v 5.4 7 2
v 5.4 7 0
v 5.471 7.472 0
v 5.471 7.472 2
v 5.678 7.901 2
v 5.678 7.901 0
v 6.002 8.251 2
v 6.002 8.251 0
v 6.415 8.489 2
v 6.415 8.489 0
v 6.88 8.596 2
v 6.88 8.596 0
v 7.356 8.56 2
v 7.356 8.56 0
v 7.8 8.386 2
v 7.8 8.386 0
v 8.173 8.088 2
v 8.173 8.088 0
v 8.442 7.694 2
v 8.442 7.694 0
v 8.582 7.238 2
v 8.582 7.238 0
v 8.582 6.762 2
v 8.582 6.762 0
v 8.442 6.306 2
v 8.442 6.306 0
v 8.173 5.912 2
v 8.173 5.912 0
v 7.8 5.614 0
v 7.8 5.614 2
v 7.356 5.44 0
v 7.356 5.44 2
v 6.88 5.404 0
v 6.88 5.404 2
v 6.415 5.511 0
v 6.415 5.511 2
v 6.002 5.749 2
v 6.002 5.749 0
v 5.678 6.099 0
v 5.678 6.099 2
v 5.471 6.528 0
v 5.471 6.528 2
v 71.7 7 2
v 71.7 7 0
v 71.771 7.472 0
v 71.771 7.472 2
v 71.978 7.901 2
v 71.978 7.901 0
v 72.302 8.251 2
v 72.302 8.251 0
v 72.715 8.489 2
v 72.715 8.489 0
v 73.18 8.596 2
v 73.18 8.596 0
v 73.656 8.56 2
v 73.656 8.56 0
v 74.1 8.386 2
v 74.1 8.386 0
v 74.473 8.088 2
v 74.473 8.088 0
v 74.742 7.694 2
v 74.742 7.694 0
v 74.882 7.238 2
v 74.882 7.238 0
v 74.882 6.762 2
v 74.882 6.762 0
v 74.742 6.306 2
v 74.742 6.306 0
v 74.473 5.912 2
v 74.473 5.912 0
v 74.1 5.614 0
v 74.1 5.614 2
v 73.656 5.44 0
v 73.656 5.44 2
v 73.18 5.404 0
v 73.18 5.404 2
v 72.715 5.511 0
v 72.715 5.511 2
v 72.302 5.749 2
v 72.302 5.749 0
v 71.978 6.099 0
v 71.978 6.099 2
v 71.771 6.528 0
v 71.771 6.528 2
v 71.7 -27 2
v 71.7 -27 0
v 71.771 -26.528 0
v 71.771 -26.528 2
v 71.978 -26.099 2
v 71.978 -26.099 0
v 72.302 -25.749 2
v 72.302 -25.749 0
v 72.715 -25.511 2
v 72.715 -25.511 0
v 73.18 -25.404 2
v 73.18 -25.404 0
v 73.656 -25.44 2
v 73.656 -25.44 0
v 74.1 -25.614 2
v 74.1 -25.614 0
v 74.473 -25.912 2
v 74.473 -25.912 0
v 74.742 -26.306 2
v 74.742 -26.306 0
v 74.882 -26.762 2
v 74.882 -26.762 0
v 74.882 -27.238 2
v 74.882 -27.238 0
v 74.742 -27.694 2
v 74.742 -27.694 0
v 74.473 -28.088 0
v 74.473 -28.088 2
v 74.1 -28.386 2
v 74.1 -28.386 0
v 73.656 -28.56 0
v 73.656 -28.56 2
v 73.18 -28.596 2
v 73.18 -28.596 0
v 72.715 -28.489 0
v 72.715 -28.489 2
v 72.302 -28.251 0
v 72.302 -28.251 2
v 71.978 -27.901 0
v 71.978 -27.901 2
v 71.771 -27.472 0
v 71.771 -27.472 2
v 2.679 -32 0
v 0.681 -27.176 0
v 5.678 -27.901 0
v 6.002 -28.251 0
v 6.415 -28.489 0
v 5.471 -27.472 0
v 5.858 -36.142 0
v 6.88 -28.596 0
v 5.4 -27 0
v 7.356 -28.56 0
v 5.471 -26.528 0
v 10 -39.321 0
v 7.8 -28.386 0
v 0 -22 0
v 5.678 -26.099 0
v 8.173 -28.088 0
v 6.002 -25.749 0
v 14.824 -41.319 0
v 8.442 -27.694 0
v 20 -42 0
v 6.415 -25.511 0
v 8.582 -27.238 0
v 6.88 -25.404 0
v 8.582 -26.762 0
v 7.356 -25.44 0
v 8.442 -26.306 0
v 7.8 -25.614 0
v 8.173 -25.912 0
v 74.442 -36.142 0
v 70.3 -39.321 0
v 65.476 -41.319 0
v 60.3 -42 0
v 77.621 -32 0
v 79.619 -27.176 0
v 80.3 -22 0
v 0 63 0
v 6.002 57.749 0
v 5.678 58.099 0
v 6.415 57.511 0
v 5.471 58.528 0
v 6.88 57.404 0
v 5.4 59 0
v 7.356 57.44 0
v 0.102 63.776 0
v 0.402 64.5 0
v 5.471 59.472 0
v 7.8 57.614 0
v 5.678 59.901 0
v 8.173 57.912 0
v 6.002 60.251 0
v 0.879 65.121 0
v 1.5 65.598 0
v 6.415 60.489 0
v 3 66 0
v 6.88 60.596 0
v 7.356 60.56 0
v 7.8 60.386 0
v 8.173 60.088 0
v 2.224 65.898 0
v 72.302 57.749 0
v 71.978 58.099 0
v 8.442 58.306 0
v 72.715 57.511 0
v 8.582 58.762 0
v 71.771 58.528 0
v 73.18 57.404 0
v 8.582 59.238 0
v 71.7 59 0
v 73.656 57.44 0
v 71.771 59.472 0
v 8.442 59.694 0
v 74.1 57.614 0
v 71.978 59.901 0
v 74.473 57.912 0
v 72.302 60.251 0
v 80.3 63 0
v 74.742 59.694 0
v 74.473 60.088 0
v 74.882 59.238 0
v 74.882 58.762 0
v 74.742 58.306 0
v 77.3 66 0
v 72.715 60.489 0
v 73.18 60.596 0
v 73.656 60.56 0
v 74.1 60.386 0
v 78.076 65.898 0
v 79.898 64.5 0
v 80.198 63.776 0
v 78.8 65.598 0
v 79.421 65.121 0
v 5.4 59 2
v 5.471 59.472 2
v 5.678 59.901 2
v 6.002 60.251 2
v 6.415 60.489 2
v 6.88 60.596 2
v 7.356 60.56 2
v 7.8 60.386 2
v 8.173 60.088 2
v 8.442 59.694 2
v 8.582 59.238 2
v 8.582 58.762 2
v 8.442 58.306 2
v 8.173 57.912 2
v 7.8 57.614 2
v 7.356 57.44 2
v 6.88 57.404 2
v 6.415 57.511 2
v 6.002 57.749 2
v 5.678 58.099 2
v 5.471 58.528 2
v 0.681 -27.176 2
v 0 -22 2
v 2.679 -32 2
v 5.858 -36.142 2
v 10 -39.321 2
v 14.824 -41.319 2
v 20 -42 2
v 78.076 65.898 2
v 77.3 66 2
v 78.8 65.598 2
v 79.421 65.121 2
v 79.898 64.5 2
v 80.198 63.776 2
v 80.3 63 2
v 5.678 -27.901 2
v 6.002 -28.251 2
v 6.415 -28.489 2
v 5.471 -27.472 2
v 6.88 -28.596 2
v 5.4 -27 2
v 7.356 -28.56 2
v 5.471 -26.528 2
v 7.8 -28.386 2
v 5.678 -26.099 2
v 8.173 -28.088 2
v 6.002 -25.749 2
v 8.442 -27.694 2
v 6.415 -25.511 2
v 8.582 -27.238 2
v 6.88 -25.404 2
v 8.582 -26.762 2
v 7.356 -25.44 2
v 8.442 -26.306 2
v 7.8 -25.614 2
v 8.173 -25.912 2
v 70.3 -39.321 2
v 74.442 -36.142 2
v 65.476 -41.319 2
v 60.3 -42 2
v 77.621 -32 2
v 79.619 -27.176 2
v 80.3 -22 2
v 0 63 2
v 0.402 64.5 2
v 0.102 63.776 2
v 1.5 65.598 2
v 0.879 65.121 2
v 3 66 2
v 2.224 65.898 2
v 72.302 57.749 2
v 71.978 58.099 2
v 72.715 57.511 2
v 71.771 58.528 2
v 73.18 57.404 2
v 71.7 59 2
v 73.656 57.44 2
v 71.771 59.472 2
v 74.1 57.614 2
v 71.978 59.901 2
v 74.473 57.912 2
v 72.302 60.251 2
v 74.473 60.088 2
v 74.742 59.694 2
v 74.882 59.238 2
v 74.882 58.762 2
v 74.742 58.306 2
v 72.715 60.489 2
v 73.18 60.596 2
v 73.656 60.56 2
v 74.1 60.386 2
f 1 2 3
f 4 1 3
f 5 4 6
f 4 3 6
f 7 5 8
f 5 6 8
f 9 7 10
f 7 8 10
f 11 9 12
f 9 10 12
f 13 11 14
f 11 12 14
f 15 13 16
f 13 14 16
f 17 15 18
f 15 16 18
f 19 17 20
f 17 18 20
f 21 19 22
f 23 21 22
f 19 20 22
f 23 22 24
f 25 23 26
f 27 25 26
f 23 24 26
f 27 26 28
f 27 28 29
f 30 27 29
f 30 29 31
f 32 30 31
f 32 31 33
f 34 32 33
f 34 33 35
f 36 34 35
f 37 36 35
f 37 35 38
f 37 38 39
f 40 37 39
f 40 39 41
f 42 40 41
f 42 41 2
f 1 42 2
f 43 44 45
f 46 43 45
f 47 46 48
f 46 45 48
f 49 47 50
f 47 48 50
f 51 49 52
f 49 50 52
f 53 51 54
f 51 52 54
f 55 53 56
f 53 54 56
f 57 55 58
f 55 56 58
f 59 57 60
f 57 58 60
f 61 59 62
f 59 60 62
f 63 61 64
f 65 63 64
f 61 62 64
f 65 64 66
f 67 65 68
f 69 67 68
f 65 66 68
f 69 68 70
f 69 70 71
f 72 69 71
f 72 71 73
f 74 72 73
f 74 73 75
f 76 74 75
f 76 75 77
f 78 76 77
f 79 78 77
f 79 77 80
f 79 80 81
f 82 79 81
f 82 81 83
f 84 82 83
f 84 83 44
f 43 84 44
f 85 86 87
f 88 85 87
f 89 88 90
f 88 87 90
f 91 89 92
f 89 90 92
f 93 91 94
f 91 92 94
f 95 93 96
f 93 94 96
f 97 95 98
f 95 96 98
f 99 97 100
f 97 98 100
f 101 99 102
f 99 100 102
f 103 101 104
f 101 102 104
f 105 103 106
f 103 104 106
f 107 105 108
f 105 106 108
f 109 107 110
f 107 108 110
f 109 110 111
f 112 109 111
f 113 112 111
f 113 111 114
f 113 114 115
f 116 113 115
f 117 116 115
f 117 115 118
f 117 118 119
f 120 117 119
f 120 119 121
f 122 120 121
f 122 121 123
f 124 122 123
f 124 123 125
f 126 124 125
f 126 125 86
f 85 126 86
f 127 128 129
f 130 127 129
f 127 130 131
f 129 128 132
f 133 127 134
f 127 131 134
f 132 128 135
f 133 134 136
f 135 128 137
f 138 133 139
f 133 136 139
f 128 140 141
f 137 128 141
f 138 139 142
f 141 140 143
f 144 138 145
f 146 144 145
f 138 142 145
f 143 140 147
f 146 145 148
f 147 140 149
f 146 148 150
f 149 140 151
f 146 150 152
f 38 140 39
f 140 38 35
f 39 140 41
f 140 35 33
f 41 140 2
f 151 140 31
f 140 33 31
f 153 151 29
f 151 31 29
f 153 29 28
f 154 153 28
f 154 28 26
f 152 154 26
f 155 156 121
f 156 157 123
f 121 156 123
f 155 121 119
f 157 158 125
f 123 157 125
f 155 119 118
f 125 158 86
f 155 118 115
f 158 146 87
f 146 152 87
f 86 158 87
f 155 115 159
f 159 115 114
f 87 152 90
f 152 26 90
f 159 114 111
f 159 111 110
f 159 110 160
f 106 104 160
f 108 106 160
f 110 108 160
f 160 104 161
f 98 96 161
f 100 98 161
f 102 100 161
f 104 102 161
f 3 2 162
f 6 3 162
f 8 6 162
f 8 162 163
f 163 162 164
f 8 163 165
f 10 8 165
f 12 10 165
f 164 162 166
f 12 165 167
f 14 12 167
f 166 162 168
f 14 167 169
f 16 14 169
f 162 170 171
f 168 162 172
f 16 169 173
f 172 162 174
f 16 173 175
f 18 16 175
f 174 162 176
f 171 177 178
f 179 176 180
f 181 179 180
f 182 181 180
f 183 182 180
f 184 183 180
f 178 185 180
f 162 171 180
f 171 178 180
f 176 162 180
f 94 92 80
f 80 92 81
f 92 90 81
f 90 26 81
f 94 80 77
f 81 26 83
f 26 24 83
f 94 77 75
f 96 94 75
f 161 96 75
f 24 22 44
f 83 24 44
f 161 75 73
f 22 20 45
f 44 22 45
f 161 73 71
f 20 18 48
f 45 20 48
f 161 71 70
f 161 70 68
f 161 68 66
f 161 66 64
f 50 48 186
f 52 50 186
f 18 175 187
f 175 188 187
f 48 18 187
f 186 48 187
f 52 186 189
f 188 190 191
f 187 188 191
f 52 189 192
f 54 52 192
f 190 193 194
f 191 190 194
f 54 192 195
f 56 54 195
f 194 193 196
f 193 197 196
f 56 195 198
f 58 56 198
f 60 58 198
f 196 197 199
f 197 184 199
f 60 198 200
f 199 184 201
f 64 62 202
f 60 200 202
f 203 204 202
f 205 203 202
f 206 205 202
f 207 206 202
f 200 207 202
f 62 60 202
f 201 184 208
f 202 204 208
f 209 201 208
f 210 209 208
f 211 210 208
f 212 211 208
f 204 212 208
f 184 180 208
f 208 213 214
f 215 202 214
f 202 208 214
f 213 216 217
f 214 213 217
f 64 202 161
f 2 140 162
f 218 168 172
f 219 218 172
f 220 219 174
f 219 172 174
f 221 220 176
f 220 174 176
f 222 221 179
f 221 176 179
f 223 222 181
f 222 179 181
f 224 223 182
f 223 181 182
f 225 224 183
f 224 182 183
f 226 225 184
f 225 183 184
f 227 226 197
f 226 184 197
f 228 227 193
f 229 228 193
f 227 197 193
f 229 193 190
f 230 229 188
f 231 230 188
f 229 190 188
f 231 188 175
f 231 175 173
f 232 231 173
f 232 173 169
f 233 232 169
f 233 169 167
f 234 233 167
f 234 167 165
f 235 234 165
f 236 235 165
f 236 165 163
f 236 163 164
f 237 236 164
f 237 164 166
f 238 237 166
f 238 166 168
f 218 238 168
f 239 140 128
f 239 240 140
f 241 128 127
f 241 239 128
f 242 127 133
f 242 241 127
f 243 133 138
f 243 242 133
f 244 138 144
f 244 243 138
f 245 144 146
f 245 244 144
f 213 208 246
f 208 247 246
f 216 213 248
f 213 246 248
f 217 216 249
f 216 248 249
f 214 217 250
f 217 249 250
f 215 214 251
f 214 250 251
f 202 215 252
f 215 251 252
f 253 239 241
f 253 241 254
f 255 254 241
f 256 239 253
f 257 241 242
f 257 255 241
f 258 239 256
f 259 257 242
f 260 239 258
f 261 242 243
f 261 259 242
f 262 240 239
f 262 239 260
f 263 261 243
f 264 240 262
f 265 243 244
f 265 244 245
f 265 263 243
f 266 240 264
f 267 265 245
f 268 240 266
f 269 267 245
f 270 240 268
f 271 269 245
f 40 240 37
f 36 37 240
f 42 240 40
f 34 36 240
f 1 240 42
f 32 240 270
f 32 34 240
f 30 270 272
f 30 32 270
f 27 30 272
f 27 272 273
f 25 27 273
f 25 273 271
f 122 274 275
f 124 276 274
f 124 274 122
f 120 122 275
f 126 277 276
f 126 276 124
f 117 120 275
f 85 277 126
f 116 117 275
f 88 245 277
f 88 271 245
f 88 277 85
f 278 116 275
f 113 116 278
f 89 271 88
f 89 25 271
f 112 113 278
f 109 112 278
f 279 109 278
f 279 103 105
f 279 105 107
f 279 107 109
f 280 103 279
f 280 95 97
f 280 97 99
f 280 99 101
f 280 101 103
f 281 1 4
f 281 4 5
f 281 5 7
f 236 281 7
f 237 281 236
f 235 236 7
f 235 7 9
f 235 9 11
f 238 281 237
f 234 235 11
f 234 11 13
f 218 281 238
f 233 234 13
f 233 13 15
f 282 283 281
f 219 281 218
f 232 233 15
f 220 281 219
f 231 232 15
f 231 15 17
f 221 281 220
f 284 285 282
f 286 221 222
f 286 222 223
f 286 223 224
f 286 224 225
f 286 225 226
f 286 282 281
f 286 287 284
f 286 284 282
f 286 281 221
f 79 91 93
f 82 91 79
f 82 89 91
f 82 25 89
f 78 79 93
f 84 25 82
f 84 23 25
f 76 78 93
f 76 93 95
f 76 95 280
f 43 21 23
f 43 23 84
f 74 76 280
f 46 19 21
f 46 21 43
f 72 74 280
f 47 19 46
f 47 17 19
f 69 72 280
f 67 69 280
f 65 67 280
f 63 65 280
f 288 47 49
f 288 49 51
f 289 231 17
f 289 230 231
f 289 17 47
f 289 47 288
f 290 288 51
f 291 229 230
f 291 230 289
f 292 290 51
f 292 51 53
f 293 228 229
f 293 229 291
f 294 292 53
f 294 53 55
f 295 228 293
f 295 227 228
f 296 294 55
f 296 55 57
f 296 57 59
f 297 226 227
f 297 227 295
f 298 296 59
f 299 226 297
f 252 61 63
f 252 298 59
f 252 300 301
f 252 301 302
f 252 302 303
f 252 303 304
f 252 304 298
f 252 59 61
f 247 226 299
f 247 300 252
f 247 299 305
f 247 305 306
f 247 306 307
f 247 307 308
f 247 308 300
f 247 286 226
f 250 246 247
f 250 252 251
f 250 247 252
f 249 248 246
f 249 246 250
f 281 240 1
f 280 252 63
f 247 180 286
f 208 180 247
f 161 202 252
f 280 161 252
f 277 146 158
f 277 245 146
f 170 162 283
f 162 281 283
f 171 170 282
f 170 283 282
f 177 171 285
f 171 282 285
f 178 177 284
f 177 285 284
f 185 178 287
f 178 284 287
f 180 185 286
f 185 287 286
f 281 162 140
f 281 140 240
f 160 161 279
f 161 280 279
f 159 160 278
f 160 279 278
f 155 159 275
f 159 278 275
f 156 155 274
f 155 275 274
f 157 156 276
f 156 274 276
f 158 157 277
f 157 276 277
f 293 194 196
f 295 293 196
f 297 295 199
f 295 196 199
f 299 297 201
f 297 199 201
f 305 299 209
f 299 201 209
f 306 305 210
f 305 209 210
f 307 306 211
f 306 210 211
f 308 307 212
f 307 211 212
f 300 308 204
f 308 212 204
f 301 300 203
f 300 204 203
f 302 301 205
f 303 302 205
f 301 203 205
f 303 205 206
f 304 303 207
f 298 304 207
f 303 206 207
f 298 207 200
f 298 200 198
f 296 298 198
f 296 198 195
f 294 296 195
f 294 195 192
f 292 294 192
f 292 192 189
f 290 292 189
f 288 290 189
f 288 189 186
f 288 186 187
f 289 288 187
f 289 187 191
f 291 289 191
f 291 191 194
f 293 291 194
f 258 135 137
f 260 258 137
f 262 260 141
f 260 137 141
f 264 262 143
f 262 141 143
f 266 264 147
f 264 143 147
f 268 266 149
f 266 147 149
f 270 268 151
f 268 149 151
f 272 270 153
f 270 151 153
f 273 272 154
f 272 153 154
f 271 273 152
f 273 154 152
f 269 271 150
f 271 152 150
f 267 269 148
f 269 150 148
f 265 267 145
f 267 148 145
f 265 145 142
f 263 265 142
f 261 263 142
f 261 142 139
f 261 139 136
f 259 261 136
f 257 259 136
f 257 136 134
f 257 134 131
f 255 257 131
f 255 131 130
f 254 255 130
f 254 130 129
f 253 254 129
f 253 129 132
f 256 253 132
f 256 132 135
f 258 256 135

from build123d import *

# Parameters (mm, degrees)
SKETCH1_W                      = 80.3
SKETCH1_H                      = 66
BOSS_EXTRUDE1_DEPTH            = 2
F_3_2_3_2_DIAMETER_HOLE1_D     = 3.2
FILLET1_R                      = 3
SKETCH4_W                      = 80.3
SKETCH4_H                      = 2
BOSS_EXTRUDE2_DEPTH            = 42
FILLET2_R                      = 20
F_3_2_3_2_DIAMETER_HOLE2_D     = 3.2
F_3_2_3_2_DIAMETER_HOLE2_DEPTH = 60
F_3_2_3_2_DIAMETER_HOLE2_TIP   = 0.96137699


with BuildPart() as part:
    # Sketch1 → Boss-Extrude1 (new body)
    with BuildSketch(Plane.XY):
        with Locations((40.15, 33)):
            Rectangle(SKETCH1_W, SKETCH1_H)
    extrude(amount=BOSS_EXTRUDE1_DEPTH)

    # Ø3.2 (3.2) Diameter Hole1 (through all)
    with Locations(Plane.XY.offset(2)):
        with Locations((7, 59), (73.3, 59), (73.3, 7), (7, 7)):
            Hole(F_3_2_3_2_DIAMETER_HOLE1_D / 2)

    # Fillet1
    fillet1_edges = [part.edges().sort_by_distance(p)[0] for p in [
        (0, 66, 1),
        (80.3, 66, 1),
    ]]
    fillet(fillet1_edges, radius=FILLET1_R)

    # Sketch4 → Boss-Extrude2 (add)
    with BuildSketch(Plane.XZ):
        with Locations((40.15, 1)):
            Rectangle(SKETCH4_W, SKETCH4_H)
    extrude(amount=BOSS_EXTRUDE2_DEPTH)

    # Fillet2
    fillet2_edges = [part.edges().sort_by_distance(p)[0] for p in [
        (0, -42, 1),
        (80.3, -42, 1),
    ]]
    fillet(fillet2_edges, radius=FILLET2_R)

    # Ø3.2 (3.2) Diameter Hole2
    with Locations(Plane.XY.offset(2)):
        with Locations((7, -27), (73.3, -27)):
            Hole(F_3_2_3_2_DIAMETER_HOLE2_D / 2, depth=F_3_2_3_2_DIAMETER_HOLE2_DEPTH)
            with Locations((0, 0, -(F_3_2_3_2_DIAMETER_HOLE2_DEPTH + F_3_2_3_2_DIAMETER_HOLE2_TIP / 2))):  # 118° drill point
                Cone(0, F_3_2_3_2_DIAMETER_HOLE2_D / 2, F_3_2_3_2_DIAMETER_HOLE2_TIP, mode=Mode.SUBTRACT)


solid = part.part
